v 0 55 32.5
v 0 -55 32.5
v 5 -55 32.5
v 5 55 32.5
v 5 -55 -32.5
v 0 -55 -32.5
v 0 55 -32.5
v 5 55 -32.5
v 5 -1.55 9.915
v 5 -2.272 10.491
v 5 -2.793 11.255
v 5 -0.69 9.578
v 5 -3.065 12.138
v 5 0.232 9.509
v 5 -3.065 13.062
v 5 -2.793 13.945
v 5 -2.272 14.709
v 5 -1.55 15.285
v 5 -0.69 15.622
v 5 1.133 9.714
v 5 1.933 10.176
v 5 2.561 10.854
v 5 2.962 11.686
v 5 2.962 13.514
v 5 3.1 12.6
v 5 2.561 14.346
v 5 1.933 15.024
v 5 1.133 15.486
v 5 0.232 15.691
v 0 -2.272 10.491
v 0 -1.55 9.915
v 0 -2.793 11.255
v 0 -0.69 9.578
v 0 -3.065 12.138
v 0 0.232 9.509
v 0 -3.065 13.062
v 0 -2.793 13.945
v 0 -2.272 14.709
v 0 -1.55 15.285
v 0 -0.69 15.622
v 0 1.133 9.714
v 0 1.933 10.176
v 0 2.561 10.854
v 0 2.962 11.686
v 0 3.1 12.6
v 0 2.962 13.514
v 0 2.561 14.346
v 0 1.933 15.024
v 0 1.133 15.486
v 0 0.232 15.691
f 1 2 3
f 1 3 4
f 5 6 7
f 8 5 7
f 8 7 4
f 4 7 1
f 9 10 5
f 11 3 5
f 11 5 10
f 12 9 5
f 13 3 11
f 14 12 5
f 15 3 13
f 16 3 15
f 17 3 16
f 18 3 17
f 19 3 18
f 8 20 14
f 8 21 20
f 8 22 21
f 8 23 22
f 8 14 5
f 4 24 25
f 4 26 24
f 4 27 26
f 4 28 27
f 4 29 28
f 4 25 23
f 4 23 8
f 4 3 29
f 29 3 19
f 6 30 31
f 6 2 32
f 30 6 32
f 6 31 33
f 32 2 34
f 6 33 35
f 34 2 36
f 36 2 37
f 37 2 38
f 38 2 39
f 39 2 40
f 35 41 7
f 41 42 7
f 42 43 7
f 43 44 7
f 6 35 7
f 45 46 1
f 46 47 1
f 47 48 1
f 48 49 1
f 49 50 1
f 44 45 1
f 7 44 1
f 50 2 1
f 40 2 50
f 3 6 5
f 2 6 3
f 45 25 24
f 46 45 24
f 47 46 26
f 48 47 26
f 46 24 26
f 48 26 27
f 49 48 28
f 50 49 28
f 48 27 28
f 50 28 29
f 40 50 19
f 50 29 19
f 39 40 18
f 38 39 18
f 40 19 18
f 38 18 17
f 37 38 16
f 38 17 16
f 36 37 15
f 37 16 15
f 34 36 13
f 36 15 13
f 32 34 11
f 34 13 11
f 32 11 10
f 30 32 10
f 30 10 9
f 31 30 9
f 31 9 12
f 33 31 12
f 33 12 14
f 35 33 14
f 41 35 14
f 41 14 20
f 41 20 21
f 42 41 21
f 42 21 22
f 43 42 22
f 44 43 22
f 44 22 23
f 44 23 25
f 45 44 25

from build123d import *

# Parameters (mm, degrees)
F0_W     = 110
F0_H     = 65
F1_DEPTH = 5
F2_R     = 3.1
F3_DEPTH = 25


with BuildPart() as f1:
    # F0 (on Right) → F1 (new body)
    with BuildSketch(Plane.YZ):
        Rectangle(F0_W, F0_H)
    extrude(amount=F1_DEPTH)

    # F2 (on face) → F3 (cut)
    with BuildSketch(Plane.YZ.offset(5)):
        with Locations((0, 12.6)):
            Circle(F2_R)
    extrude(amount=-F3_DEPTH, mode=Mode.SUBTRACT)


solid = f1.part
